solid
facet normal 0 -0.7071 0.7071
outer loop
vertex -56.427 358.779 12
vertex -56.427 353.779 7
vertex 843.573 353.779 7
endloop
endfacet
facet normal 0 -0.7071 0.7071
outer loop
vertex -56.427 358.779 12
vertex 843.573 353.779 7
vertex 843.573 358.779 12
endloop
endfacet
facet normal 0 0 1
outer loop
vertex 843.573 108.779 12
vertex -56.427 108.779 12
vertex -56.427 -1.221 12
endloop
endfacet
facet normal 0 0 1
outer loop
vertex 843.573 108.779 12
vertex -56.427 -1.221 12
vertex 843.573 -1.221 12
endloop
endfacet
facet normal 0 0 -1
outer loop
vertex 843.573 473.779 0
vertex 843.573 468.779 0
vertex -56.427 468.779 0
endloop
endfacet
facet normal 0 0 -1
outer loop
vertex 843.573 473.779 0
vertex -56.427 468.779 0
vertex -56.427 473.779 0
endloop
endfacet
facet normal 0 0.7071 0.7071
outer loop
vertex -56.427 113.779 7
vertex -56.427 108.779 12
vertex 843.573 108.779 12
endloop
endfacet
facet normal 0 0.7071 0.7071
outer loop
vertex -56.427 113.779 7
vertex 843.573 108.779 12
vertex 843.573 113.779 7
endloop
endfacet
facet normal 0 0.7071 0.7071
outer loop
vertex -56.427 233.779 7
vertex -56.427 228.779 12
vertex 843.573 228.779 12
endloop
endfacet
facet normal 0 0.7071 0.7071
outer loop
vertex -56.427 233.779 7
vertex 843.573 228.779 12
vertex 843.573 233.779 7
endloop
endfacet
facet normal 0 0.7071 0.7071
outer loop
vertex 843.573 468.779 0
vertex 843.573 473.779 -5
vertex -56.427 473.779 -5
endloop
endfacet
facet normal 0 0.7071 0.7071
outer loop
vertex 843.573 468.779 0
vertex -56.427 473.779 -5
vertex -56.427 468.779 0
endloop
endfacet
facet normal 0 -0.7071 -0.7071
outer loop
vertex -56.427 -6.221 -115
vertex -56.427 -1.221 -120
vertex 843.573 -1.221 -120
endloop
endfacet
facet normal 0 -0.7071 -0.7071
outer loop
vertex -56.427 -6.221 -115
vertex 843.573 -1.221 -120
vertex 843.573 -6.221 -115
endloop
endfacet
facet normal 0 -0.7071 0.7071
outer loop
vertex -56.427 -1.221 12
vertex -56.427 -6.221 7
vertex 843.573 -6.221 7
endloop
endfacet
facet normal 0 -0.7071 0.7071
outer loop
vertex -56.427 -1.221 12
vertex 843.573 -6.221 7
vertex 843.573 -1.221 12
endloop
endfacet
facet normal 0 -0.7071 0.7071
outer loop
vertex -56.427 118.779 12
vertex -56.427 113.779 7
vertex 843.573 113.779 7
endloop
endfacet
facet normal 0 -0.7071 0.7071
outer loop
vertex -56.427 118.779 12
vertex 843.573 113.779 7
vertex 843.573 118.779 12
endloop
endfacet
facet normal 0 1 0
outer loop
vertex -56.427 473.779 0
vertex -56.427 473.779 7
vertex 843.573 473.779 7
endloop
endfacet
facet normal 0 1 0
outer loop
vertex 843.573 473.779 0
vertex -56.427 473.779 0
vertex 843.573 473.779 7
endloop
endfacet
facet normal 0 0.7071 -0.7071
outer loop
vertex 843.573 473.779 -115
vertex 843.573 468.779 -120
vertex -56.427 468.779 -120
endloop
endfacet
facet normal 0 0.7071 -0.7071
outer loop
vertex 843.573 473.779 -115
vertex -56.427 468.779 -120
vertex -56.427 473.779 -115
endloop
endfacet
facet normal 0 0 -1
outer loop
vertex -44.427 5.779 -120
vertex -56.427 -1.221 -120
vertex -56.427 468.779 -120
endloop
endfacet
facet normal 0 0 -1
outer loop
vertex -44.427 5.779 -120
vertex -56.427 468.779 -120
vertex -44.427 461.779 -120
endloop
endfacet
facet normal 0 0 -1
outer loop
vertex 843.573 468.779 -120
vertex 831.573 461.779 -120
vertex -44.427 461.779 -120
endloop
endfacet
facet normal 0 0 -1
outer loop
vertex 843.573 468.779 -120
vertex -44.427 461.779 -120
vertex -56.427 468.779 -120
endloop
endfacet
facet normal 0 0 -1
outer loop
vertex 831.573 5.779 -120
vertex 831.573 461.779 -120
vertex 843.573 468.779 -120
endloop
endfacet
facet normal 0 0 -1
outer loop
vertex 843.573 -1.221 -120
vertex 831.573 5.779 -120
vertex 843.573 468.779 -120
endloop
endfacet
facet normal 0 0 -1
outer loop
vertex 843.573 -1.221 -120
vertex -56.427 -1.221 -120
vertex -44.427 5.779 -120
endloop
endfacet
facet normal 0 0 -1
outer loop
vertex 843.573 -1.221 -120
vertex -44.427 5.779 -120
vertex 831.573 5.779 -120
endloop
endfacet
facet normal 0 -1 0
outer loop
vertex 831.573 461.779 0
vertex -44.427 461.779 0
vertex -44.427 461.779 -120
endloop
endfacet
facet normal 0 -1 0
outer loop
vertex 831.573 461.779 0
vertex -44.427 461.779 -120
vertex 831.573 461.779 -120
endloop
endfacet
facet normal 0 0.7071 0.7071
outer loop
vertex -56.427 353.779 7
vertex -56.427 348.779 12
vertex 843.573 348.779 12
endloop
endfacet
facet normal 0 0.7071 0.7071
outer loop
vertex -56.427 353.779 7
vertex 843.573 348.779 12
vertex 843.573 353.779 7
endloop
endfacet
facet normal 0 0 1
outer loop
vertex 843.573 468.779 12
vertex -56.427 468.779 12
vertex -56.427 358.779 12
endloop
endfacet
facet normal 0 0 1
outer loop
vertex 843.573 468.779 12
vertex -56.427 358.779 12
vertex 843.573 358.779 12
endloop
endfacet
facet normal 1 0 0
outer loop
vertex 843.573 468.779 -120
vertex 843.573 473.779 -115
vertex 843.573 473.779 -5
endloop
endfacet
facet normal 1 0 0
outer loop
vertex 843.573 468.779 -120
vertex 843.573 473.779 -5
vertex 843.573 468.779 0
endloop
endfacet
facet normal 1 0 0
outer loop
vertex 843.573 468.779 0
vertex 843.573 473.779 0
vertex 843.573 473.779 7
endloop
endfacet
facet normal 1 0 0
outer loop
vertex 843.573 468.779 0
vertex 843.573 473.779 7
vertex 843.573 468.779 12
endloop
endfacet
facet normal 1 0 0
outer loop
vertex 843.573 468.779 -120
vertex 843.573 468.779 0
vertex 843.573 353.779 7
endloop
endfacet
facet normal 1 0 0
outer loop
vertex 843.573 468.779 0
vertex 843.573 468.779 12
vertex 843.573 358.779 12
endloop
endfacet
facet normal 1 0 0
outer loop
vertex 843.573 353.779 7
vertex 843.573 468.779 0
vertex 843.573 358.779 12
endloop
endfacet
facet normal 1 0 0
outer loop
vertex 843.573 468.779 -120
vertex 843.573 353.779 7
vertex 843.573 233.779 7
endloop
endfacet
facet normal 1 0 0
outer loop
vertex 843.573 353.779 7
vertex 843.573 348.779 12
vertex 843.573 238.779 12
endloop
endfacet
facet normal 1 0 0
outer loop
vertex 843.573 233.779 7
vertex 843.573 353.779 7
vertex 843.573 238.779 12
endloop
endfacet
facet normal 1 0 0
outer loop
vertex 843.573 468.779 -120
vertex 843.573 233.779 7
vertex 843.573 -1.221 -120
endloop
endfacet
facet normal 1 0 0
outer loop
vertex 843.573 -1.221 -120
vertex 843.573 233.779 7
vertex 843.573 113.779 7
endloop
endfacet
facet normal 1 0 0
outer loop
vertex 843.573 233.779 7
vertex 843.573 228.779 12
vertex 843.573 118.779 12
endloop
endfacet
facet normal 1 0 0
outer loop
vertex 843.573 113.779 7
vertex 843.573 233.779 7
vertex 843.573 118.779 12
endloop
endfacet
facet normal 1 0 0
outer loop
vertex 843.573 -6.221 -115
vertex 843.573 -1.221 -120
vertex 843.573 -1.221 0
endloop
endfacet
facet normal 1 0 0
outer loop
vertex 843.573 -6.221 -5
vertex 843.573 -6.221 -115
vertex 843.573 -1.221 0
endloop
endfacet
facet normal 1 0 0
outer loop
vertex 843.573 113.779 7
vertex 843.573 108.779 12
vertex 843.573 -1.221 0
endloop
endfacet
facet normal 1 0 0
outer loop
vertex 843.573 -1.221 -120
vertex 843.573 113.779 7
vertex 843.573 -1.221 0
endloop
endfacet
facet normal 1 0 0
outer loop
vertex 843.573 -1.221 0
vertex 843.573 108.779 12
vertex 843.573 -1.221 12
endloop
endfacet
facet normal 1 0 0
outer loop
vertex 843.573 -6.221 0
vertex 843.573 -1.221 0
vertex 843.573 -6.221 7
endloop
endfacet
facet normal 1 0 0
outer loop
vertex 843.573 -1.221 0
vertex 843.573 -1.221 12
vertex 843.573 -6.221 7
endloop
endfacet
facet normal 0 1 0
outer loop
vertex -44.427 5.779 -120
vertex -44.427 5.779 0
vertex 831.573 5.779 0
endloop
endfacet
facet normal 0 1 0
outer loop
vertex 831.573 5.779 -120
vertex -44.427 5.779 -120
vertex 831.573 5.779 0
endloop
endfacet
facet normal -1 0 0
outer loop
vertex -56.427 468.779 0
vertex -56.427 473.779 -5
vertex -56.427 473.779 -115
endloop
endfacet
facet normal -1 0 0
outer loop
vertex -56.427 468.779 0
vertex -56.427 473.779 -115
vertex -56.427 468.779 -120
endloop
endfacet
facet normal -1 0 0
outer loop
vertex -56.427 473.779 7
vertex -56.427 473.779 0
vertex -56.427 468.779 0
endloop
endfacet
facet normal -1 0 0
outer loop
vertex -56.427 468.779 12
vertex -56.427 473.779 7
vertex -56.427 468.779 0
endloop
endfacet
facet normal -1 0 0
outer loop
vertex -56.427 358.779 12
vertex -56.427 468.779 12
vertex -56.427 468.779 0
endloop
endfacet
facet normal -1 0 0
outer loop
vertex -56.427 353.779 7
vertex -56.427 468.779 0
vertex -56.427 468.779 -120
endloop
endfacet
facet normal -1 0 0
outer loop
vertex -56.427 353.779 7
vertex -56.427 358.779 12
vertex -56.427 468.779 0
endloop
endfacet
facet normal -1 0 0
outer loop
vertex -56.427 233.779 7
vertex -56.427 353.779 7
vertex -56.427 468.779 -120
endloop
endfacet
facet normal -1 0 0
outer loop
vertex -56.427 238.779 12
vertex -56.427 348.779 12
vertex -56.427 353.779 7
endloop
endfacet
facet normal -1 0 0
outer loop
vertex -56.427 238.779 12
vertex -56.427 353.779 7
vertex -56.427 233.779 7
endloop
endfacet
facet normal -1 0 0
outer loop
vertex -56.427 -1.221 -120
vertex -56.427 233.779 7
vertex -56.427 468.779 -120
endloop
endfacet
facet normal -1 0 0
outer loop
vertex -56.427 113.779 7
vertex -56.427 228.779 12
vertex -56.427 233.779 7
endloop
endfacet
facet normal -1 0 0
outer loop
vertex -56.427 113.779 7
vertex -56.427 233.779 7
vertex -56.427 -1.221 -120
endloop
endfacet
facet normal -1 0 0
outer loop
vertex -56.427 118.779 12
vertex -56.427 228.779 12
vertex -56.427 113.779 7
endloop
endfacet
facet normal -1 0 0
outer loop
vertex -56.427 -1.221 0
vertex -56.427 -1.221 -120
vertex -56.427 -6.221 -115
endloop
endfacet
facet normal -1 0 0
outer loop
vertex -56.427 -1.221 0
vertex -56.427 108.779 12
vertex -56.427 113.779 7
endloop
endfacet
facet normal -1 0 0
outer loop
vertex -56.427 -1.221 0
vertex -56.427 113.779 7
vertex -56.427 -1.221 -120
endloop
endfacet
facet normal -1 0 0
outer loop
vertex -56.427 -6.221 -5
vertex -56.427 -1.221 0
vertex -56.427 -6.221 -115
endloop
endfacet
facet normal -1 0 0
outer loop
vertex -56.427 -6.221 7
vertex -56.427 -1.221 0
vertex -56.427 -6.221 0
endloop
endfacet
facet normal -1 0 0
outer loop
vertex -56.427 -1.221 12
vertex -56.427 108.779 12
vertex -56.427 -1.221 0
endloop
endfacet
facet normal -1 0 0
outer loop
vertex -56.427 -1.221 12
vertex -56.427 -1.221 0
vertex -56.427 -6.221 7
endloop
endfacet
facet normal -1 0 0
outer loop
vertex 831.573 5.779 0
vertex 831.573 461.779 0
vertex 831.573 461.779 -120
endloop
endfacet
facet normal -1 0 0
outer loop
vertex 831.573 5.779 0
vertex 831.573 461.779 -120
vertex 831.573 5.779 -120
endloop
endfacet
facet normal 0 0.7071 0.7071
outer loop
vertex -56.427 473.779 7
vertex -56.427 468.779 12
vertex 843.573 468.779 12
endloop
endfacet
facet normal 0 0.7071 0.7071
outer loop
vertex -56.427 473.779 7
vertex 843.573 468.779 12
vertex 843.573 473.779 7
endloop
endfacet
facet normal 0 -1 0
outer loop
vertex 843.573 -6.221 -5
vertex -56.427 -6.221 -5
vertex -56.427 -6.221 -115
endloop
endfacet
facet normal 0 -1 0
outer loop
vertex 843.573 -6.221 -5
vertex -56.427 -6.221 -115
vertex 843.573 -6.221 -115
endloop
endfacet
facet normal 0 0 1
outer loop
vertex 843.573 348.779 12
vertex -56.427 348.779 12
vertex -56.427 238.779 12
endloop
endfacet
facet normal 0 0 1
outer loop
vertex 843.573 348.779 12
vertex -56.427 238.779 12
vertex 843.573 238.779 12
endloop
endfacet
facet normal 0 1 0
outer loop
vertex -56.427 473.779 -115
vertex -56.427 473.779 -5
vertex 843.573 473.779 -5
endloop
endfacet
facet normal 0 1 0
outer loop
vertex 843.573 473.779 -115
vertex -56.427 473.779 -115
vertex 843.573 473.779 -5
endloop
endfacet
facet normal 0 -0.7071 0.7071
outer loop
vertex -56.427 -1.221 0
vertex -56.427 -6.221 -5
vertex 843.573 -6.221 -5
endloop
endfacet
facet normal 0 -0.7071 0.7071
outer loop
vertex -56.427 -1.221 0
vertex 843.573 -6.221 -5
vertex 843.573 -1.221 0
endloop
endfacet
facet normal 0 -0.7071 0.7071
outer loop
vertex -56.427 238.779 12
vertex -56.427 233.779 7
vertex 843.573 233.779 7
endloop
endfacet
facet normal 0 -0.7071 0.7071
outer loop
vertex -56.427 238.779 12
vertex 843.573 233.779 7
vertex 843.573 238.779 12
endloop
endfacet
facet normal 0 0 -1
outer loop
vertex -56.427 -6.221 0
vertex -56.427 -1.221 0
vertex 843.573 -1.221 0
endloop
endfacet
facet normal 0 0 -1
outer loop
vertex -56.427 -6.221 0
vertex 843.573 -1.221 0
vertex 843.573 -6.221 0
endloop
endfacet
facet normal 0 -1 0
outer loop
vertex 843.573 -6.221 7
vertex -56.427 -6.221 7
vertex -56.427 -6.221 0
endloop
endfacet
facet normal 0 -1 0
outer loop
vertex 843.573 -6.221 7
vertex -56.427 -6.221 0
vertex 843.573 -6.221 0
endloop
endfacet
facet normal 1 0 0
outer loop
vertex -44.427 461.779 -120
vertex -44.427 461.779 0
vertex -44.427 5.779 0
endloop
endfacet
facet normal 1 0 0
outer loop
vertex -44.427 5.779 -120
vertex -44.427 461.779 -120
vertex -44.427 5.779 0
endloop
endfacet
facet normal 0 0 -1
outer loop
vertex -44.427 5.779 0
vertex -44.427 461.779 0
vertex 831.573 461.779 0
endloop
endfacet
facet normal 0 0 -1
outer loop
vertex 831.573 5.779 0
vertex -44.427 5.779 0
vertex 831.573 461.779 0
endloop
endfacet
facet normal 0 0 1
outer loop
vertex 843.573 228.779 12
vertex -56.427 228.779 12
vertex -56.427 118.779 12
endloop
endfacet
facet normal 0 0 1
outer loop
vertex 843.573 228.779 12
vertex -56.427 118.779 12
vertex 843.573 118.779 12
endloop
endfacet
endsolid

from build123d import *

# Parameters (mm, degrees)
F0_W      = 900
F0_H      = 480
F1_DEPTH  = 12
F3_DEPTH  = 900.001
F4_W      = 900
F4_H      = 12
F5_DEPTH  = 120
F6_W      = 900
F6_H      = 12
F7_DEPTH  = 120
F8_W      = 12
F8_H      = 456
F9_DEPTH  = 120
F10_W     = 12
F10_H     = 456
F11_DEPTH = 120
F13_DEPTH = 900.001
F15_DEPTH = 900.001


with BuildPart() as f1:
    # F0 (on Top) → F1 (new body)
    with BuildSketch(Plane.XY):
        with Locations((393.5734190047, 233.7786073424)):
            Rectangle(F0_W, F0_H)
    extrude(amount=F1_DEPTH)

    # F2 (on face) → F3 (cut, through all)
    with BuildSketch(Plane.YZ.offset(843.5734190047)):
        Polygon((-1.2213926576, 12), (-6.2213926576, 12), (-6.2213926576, 7), align=None)
        Polygon((118.7786073424, 12), (113.7786073424, 12), (108.7786073424, 12), (113.7786073424, 7), align=None)
        Polygon((238.7786073424, 12), (233.7786073424, 12), (228.7786073424, 12), (233.7786073424, 7), align=None)
        Polygon((358.7786073424, 12), (353.7786073424, 12), (348.7786073424, 12), (353.7786073424, 7), align=None)
        Polygon((473.7786073424, 7), (473.7786073424, 12), (468.7786073424, 12), align=None)
    extrude(amount=-F3_DEPTH, mode=Mode.SUBTRACT)

    # F4 (on face) → F5 (join)
    with BuildSketch(Plane(origin=(0, 0, 0), x_dir=(1, 0, 0), z_dir=(0, 0, -1))):
        with Locations((393.5734190047, -467.7786073424)):
            Rectangle(F4_W, F4_H)
    extrude(amount=F5_DEPTH)

    # F6 (on face) → F7 (join)
    with BuildSketch(Plane(origin=(0, 0, 0), x_dir=(1, 0, 0), z_dir=(0, 0, -1))):
        with Locations((393.5734190047, 0.2213926576)):
            Rectangle(F6_W, F6_H)
    extrude(amount=F7_DEPTH)

    # F8 (on face) → F9 (join)
    with BuildSketch(Plane(origin=(0, 0, 0), x_dir=(1, 0, 0), z_dir=(0, 0, -1))):
        with Locations((-50.4265809953, -233.7786073424)):
            Rectangle(F8_W, F8_H)
    extrude(amount=F9_DEPTH)

    # F10 (on face) → F11 (join)
    with BuildSketch(Plane(origin=(0, 0, 0), x_dir=(1, 0, 0), z_dir=(0, 0, -1))):
        with Locations((837.5734190047, -233.7786073424)):
            Rectangle(F10_W, F10_H)
    extrude(amount=F11_DEPTH)

    # F12 (on face) → F13 (cut, through all)
    with BuildSketch(Plane.YZ.offset(843.5734190047)):
        Polygon((-1.2213926576, 0), (-6.2213926576, 0), (-6.2213926576, -5), align=None)
        Polygon((-6.2213926576, -115), (-6.2213926576, -120), (-1.2213926576, -120), align=None)
    extrude(amount=-F13_DEPTH, mode=Mode.SUBTRACT)

    # F14 (on face) → F15 (cut, through all)
    with BuildSketch(Plane(origin=(-56.4265809953, 0, 0), x_dir=(0, -1, 0), z_dir=(-1, 0, 0))):
        Polygon((-468.7786073424, 0), (-473.7786073424, 0), (-473.7786073424, -5), align=None)
        Polygon((-473.7786073424, -115), (-473.7786073424, -120), (-468.7786073424, -120), align=None)
    extrude(amount=-F15_DEPTH, mode=Mode.SUBTRACT)


solid = f1.part
